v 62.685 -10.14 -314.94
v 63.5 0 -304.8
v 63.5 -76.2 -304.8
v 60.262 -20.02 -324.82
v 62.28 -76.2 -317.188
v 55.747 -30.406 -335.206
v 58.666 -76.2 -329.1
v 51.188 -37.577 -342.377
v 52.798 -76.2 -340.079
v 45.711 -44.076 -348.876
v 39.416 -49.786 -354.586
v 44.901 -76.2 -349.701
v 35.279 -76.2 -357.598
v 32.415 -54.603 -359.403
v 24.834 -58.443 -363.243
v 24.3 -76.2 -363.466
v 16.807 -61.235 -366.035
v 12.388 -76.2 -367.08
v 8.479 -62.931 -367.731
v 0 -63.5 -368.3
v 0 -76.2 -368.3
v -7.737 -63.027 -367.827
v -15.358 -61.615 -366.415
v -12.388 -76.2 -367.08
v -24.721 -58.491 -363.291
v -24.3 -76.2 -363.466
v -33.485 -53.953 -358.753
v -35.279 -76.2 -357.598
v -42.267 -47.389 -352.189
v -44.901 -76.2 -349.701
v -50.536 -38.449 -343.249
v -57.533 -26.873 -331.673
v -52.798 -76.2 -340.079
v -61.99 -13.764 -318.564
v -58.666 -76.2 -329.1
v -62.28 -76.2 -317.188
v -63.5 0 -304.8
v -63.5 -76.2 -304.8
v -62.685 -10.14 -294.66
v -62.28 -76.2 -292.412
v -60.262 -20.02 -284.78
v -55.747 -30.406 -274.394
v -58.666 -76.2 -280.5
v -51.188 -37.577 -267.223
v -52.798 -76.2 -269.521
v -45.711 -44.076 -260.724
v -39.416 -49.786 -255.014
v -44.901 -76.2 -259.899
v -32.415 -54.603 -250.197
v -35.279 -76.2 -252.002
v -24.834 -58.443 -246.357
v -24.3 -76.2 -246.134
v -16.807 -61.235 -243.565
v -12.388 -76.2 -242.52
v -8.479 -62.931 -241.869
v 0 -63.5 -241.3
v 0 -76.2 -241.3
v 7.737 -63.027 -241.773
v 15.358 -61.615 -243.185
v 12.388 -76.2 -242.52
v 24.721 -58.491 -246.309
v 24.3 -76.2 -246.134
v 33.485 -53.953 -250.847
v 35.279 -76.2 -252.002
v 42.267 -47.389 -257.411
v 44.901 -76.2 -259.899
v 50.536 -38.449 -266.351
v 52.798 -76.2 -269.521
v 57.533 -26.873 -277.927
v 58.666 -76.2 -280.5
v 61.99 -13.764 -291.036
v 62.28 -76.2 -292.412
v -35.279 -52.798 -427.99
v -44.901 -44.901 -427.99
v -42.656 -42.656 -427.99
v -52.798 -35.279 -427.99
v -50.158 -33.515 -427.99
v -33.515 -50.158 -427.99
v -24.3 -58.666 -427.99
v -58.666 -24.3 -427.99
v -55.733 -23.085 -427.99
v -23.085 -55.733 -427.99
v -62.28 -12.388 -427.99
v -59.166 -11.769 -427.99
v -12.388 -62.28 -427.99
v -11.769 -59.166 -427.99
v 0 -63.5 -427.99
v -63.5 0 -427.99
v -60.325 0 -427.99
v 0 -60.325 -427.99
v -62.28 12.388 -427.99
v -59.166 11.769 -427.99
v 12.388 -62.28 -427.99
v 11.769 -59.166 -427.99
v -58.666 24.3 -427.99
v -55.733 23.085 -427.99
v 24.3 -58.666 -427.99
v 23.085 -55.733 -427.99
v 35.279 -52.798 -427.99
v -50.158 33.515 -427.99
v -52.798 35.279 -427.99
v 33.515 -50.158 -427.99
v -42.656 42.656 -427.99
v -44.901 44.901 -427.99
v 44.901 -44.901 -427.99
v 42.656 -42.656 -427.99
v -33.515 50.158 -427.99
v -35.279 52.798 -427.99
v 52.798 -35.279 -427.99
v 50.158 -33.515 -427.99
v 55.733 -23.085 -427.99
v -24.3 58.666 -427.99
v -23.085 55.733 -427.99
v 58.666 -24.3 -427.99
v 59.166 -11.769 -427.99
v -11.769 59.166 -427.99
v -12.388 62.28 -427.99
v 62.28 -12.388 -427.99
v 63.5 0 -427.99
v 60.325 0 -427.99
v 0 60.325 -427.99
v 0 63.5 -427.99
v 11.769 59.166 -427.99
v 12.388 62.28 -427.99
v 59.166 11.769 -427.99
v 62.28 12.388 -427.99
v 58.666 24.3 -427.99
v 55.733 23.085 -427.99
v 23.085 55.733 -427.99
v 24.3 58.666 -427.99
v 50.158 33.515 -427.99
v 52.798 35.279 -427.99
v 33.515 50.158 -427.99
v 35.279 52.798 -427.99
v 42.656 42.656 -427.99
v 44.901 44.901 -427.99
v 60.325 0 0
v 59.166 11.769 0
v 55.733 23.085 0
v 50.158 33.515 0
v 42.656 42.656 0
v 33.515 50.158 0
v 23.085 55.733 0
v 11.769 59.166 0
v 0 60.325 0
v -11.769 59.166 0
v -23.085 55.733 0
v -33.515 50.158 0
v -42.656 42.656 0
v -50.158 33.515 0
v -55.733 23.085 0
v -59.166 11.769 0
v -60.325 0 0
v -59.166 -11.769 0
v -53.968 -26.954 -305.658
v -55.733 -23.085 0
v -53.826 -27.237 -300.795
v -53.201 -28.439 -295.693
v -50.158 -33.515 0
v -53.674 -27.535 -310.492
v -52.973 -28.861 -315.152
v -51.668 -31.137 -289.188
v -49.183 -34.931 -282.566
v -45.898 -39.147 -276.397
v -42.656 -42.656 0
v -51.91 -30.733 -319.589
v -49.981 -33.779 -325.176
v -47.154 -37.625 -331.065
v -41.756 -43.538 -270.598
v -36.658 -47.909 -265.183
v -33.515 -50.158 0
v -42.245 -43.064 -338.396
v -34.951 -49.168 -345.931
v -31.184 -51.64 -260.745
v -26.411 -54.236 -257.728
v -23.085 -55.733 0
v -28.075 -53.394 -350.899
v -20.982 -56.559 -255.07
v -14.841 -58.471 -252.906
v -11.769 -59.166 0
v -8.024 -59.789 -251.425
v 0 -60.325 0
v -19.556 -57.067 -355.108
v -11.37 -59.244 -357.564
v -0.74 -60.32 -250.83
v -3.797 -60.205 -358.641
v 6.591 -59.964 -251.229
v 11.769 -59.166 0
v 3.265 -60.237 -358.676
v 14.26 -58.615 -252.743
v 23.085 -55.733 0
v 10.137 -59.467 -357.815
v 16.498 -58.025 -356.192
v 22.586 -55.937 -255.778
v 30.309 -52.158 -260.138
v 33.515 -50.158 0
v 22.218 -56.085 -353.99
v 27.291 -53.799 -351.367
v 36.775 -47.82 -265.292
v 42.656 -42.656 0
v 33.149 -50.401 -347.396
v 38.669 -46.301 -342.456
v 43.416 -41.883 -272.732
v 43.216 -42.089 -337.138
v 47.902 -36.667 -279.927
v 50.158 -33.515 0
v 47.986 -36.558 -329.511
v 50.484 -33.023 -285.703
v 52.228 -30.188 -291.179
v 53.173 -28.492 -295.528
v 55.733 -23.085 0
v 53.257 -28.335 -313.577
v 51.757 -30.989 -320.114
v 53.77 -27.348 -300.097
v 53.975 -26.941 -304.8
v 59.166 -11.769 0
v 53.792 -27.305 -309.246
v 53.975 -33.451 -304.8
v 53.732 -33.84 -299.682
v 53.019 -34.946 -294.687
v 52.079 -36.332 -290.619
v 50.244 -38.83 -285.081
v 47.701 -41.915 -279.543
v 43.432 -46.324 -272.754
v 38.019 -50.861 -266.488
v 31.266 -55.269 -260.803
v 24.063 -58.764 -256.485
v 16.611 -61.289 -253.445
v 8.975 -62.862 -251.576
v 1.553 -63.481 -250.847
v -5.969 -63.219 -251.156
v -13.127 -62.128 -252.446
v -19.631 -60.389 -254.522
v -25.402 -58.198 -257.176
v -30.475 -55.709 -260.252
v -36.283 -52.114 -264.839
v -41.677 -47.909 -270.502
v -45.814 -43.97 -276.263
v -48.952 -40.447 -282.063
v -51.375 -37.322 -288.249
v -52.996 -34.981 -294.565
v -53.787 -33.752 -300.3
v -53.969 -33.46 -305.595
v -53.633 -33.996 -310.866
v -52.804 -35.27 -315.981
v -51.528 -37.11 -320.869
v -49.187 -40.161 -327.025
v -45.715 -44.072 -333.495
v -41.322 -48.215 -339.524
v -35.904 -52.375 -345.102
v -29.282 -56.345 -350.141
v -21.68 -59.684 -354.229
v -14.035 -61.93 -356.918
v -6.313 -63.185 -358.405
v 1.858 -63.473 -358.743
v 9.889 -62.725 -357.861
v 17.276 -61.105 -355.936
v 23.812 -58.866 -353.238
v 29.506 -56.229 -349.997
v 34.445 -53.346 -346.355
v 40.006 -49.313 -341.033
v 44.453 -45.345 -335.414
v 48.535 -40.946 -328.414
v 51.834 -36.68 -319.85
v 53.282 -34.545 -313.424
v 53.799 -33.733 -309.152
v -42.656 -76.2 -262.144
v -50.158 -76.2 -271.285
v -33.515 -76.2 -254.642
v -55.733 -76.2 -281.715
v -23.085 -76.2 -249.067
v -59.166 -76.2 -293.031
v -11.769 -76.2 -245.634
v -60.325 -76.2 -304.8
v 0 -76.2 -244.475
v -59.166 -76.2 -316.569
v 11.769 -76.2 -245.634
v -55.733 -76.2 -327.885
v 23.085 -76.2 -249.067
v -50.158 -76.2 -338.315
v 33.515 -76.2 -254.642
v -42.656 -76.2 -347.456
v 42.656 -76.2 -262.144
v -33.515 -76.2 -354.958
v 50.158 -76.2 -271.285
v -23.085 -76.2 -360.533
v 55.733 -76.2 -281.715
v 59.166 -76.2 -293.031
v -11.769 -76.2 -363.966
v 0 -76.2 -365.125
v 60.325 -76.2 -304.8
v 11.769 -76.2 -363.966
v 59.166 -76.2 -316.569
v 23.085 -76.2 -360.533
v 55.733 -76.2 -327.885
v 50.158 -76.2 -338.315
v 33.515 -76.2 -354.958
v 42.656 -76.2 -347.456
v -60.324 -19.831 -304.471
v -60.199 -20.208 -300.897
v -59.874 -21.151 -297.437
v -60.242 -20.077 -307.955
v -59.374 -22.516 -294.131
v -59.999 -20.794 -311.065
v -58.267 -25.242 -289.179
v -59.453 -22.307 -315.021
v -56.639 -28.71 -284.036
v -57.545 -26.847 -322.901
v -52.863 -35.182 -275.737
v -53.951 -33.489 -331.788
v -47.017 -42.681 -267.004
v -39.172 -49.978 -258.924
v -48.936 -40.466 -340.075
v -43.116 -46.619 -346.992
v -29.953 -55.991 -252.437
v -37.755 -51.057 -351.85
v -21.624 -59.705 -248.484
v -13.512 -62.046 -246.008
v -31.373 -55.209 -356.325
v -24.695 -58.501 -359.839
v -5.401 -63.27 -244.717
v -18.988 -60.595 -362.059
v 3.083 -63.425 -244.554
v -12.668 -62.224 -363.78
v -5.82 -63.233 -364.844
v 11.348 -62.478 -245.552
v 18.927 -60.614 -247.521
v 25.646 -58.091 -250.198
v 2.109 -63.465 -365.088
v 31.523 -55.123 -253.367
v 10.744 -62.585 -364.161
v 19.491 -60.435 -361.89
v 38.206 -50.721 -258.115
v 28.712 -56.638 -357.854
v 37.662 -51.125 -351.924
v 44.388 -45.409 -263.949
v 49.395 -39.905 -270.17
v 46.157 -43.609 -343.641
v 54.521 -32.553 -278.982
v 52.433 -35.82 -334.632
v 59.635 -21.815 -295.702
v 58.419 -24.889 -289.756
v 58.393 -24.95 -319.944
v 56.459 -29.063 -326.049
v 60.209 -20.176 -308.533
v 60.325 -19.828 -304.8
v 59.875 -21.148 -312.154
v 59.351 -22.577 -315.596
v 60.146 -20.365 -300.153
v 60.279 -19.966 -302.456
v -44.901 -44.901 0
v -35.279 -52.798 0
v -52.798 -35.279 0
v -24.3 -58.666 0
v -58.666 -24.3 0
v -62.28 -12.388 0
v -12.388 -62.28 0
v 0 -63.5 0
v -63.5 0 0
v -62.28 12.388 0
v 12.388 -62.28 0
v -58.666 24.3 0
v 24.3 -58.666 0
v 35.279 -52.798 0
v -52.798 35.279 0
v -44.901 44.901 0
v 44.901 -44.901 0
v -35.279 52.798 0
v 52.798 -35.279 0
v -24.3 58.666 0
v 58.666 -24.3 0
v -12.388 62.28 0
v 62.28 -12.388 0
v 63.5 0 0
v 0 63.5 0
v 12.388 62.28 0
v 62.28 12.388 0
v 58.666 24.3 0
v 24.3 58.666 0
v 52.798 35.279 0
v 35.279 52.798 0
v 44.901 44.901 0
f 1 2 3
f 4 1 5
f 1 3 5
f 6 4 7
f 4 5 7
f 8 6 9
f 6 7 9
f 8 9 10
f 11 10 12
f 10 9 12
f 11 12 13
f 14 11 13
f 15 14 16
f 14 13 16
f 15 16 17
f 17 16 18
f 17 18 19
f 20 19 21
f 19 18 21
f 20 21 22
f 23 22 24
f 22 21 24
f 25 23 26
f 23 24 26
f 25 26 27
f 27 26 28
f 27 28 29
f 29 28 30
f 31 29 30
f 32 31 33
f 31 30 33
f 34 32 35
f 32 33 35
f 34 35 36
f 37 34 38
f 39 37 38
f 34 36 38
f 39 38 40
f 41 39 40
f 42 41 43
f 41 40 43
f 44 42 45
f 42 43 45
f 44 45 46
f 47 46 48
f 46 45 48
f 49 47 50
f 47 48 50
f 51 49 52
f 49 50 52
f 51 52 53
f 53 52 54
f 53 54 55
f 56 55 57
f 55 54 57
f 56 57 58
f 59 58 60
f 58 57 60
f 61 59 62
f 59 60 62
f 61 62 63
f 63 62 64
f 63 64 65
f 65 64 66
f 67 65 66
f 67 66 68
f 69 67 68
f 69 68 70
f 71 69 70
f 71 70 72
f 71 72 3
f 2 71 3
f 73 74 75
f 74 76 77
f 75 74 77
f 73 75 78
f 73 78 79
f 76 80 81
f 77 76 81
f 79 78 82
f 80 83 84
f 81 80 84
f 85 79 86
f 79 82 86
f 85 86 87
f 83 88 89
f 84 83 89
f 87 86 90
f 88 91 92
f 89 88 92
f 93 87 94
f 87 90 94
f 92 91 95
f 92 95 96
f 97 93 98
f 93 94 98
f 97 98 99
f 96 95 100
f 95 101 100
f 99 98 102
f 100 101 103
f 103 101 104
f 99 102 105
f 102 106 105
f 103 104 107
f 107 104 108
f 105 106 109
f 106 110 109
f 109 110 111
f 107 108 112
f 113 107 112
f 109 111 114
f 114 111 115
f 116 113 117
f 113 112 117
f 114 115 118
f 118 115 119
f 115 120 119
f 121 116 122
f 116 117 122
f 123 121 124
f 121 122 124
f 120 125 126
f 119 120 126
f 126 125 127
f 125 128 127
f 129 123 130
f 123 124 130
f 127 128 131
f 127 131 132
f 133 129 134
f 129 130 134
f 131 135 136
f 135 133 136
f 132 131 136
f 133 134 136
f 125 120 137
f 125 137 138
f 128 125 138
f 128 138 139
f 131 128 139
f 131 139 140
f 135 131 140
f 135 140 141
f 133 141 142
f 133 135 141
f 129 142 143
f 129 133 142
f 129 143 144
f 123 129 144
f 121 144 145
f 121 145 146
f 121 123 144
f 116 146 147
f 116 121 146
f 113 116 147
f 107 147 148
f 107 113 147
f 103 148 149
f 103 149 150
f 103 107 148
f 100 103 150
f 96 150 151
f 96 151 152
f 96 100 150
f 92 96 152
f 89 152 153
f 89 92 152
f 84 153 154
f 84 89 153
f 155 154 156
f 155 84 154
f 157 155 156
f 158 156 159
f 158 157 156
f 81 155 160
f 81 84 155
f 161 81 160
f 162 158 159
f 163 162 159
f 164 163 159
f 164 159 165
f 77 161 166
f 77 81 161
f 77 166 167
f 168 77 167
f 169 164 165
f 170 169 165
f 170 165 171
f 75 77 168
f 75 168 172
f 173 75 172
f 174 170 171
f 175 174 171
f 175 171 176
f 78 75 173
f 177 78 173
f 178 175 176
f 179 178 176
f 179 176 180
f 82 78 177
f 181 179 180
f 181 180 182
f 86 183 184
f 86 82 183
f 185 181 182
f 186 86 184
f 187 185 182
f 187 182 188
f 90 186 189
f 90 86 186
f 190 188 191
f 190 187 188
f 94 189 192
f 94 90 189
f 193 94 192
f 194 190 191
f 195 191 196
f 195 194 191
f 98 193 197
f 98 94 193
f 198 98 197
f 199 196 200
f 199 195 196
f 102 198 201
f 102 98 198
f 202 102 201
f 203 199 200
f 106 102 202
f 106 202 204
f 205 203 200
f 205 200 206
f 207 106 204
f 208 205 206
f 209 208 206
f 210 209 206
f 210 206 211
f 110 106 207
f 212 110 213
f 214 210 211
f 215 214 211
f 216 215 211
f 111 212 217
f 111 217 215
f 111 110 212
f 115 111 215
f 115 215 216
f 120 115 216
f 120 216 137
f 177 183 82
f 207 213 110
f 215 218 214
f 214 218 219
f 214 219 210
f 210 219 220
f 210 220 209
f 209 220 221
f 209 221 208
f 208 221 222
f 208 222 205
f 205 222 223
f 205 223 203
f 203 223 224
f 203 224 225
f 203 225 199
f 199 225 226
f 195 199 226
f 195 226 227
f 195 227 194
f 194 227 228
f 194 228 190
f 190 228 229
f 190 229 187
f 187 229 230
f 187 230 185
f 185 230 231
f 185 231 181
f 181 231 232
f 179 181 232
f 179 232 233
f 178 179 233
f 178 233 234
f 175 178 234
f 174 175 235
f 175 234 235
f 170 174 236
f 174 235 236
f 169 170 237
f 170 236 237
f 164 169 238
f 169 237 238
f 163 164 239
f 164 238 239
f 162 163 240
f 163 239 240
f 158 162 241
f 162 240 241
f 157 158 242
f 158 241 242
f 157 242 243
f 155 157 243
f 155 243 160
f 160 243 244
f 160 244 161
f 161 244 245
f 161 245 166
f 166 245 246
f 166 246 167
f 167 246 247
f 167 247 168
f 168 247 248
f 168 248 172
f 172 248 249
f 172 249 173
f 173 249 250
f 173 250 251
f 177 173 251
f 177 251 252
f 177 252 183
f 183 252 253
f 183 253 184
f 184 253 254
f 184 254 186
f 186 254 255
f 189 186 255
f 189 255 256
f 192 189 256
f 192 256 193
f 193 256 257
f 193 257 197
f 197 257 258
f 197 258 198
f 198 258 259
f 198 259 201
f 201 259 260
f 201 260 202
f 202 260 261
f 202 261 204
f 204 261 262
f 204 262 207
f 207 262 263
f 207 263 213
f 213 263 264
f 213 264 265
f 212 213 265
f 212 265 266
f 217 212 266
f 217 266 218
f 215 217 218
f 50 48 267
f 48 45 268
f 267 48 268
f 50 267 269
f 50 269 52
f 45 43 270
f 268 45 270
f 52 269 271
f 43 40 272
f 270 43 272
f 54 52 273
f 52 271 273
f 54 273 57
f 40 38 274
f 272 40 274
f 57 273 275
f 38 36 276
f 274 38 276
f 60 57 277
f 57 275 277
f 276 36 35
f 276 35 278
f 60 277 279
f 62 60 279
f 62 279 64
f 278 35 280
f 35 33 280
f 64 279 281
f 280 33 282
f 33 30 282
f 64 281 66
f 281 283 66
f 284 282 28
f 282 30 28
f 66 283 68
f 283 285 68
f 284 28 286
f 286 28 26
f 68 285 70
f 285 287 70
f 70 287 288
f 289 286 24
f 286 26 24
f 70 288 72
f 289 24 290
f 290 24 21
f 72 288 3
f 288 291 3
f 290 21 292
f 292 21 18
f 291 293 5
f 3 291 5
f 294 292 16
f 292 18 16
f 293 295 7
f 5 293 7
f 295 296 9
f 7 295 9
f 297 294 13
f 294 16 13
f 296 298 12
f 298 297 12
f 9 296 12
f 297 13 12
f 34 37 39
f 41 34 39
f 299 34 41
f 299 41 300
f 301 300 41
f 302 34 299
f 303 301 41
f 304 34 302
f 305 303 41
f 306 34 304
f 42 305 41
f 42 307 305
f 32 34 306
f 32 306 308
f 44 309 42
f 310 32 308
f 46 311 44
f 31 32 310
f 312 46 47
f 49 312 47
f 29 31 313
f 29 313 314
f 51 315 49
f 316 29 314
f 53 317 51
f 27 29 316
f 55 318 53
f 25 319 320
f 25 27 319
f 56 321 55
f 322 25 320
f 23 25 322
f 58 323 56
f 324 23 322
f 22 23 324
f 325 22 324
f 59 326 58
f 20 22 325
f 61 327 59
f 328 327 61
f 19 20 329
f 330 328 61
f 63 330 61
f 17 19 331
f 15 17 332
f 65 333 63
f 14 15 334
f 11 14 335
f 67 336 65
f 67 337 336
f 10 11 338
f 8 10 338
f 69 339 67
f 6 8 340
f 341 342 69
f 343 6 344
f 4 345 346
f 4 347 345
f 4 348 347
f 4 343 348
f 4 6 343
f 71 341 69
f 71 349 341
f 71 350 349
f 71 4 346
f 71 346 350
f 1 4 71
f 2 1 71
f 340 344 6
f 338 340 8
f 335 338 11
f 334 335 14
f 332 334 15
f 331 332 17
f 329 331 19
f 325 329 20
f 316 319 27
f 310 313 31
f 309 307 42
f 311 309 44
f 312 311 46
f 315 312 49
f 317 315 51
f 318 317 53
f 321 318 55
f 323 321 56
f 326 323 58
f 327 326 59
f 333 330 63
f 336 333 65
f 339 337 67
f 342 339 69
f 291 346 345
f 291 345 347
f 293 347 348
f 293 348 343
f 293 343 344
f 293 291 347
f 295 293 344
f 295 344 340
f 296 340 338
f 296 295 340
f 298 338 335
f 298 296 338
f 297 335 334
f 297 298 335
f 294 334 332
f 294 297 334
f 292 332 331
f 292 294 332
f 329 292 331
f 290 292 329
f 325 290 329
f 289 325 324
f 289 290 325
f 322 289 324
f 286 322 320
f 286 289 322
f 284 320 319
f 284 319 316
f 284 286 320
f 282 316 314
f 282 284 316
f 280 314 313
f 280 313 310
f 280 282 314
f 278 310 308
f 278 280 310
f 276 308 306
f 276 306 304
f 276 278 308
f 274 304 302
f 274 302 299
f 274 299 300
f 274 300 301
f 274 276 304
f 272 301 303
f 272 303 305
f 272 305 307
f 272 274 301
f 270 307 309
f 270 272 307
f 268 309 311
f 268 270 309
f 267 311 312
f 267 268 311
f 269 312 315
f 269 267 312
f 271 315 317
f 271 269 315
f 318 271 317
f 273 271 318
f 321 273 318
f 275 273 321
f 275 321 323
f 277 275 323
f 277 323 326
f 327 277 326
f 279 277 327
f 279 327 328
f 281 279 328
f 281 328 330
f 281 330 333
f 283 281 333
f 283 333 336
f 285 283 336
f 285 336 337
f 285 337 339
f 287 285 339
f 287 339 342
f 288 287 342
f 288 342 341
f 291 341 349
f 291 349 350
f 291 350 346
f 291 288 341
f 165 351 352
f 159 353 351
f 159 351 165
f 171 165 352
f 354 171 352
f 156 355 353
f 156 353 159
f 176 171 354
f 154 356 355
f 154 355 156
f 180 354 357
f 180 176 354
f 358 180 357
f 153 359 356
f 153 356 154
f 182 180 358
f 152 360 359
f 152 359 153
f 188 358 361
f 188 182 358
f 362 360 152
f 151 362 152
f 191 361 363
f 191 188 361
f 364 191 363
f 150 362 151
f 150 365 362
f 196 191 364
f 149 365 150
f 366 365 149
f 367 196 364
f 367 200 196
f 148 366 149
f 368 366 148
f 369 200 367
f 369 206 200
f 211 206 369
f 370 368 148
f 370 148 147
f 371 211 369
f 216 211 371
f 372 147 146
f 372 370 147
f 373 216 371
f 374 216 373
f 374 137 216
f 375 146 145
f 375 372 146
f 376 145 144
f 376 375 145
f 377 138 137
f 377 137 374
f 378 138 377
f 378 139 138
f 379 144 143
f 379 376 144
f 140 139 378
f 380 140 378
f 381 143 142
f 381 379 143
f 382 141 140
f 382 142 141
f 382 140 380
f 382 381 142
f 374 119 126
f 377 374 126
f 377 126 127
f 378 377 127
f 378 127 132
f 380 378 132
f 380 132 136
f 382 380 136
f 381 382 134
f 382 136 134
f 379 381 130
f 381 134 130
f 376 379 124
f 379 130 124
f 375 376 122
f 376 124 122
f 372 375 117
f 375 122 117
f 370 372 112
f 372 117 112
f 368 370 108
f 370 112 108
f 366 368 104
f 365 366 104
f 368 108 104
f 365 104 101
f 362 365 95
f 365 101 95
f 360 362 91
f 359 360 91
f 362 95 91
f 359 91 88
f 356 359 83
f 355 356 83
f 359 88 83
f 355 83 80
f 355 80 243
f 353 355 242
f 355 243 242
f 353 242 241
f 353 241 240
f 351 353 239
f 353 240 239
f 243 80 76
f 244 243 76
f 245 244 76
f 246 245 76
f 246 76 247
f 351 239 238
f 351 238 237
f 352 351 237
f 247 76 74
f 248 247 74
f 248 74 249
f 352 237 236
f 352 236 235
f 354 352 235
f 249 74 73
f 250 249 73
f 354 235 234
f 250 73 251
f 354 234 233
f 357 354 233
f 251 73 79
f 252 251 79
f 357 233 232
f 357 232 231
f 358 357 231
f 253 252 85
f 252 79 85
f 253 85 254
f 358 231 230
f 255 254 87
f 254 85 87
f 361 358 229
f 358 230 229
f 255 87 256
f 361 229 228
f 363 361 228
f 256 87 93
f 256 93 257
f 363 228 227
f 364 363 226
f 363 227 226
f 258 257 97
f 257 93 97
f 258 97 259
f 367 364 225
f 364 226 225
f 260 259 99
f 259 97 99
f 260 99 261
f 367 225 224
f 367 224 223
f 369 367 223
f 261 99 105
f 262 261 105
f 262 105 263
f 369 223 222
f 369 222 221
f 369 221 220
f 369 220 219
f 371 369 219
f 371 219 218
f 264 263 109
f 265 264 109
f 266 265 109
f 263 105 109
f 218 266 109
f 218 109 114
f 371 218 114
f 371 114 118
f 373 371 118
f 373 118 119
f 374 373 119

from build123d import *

# Parameters (mm, degrees)
STRUCTURAL_START                 = -76.2
STRUCTURAL_MEMBER1_OUTLINE_R     = 63.5
STRUCTURAL_MEMBER1_OUTLINE_R_2   = 60.325
STRUCTURAL_MEMBER1_DEPTH         = 12.6999999
STRUCTURAL_START_2               = -63.5000001
STRUCTURAL_MEMBER1_2_OUTLINE_R   = 63.5
STRUCTURAL_MEMBER1_2_OUTLINE_R_2 = 60.325
STRUCTURAL_MEMBER1_2_DEPTH       = 63.5000002
STRUCTURAL_START_3               = -369
STRUCTURAL_MEMBER1_3_DEPTH       = 129
STRUCTURAL_START_4               = -427.99
STRUCTURAL_MEMBER1_4_OUTLINE_R   = 63.5
STRUCTURAL_MEMBER1_4_OUTLINE_R_2 = 60.325
STRUCTURAL_MEMBER1_4_DEPTH       = 427.99
SKETCH3_R                        = 53.975
CUT_EXTRUDE3_DEPTH               = 88.9


with BuildPart() as part:
    # Structural Member1: read off the stored shape, not the designer's step
    # Structural Member1 outline → Structural Member1 (new body)
    with BuildSketch(Plane(origin=(0, 0, 0), x_dir=(1, 0, 0), z_dir=(0, 1, 0)).offset(STRUCTURAL_START)):
        with Locations((0, 304.8)):
            Circle(STRUCTURAL_MEMBER1_OUTLINE_R)
        with Locations((0, 304.8)):
            Circle(STRUCTURAL_MEMBER1_OUTLINE_R_2, mode=Mode.SUBTRACT)
    extrude(amount=STRUCTURAL_MEMBER1_DEPTH)

    # Structural Member1 2 outline → Structural Member1 2 (add)
    with BuildSketch(Plane(origin=(0, 0, 0), x_dir=(1, 0, 0), z_dir=(0, 1, 0)).offset(STRUCTURAL_START_2)):
        with Locations((0, 304.8)):
            Circle(STRUCTURAL_MEMBER1_2_OUTLINE_R)
        with Locations((0, 304.8)):
            Circle(STRUCTURAL_MEMBER1_2_OUTLINE_R_2, mode=Mode.SUBTRACT)
    extrude(amount=STRUCTURAL_MEMBER1_2_DEPTH)

    # Structural Member1 3 outline → Structural Member1 3 (cut)
    with BuildSketch(Plane.XY.offset(STRUCTURAL_START_3)):
        with BuildLine():
            Line((63.5, 0), (-63.5, 0))
            ThreePointArc((-63.5, 0), (0, -63.5), (63.5, 0))
        make_face()
    extrude(amount=STRUCTURAL_MEMBER1_3_DEPTH, mode=Mode.SUBTRACT)


with BuildPart() as body_2:
    # Structural Member1 4 outline → Structural Member1 4 (new body)
    with BuildSketch(Plane.XY.offset(STRUCTURAL_START_4)):
        Circle(STRUCTURAL_MEMBER1_4_OUTLINE_R)
        Circle(STRUCTURAL_MEMBER1_4_OUTLINE_R_2, mode=Mode.SUBTRACT)
    extrude(amount=STRUCTURAL_MEMBER1_4_DEPTH)

    # Sketch3 → Cut-Extrude3 (cut)
    with BuildSketch(Plane.XZ.offset(76.2)):
        with Locations((0, -304.8)):
            Circle(SKETCH3_R)
    extrude(amount=-CUT_EXTRUDE3_DEPTH, mode=Mode.SUBTRACT)


solid = Compound([part.part, body_2.part])
